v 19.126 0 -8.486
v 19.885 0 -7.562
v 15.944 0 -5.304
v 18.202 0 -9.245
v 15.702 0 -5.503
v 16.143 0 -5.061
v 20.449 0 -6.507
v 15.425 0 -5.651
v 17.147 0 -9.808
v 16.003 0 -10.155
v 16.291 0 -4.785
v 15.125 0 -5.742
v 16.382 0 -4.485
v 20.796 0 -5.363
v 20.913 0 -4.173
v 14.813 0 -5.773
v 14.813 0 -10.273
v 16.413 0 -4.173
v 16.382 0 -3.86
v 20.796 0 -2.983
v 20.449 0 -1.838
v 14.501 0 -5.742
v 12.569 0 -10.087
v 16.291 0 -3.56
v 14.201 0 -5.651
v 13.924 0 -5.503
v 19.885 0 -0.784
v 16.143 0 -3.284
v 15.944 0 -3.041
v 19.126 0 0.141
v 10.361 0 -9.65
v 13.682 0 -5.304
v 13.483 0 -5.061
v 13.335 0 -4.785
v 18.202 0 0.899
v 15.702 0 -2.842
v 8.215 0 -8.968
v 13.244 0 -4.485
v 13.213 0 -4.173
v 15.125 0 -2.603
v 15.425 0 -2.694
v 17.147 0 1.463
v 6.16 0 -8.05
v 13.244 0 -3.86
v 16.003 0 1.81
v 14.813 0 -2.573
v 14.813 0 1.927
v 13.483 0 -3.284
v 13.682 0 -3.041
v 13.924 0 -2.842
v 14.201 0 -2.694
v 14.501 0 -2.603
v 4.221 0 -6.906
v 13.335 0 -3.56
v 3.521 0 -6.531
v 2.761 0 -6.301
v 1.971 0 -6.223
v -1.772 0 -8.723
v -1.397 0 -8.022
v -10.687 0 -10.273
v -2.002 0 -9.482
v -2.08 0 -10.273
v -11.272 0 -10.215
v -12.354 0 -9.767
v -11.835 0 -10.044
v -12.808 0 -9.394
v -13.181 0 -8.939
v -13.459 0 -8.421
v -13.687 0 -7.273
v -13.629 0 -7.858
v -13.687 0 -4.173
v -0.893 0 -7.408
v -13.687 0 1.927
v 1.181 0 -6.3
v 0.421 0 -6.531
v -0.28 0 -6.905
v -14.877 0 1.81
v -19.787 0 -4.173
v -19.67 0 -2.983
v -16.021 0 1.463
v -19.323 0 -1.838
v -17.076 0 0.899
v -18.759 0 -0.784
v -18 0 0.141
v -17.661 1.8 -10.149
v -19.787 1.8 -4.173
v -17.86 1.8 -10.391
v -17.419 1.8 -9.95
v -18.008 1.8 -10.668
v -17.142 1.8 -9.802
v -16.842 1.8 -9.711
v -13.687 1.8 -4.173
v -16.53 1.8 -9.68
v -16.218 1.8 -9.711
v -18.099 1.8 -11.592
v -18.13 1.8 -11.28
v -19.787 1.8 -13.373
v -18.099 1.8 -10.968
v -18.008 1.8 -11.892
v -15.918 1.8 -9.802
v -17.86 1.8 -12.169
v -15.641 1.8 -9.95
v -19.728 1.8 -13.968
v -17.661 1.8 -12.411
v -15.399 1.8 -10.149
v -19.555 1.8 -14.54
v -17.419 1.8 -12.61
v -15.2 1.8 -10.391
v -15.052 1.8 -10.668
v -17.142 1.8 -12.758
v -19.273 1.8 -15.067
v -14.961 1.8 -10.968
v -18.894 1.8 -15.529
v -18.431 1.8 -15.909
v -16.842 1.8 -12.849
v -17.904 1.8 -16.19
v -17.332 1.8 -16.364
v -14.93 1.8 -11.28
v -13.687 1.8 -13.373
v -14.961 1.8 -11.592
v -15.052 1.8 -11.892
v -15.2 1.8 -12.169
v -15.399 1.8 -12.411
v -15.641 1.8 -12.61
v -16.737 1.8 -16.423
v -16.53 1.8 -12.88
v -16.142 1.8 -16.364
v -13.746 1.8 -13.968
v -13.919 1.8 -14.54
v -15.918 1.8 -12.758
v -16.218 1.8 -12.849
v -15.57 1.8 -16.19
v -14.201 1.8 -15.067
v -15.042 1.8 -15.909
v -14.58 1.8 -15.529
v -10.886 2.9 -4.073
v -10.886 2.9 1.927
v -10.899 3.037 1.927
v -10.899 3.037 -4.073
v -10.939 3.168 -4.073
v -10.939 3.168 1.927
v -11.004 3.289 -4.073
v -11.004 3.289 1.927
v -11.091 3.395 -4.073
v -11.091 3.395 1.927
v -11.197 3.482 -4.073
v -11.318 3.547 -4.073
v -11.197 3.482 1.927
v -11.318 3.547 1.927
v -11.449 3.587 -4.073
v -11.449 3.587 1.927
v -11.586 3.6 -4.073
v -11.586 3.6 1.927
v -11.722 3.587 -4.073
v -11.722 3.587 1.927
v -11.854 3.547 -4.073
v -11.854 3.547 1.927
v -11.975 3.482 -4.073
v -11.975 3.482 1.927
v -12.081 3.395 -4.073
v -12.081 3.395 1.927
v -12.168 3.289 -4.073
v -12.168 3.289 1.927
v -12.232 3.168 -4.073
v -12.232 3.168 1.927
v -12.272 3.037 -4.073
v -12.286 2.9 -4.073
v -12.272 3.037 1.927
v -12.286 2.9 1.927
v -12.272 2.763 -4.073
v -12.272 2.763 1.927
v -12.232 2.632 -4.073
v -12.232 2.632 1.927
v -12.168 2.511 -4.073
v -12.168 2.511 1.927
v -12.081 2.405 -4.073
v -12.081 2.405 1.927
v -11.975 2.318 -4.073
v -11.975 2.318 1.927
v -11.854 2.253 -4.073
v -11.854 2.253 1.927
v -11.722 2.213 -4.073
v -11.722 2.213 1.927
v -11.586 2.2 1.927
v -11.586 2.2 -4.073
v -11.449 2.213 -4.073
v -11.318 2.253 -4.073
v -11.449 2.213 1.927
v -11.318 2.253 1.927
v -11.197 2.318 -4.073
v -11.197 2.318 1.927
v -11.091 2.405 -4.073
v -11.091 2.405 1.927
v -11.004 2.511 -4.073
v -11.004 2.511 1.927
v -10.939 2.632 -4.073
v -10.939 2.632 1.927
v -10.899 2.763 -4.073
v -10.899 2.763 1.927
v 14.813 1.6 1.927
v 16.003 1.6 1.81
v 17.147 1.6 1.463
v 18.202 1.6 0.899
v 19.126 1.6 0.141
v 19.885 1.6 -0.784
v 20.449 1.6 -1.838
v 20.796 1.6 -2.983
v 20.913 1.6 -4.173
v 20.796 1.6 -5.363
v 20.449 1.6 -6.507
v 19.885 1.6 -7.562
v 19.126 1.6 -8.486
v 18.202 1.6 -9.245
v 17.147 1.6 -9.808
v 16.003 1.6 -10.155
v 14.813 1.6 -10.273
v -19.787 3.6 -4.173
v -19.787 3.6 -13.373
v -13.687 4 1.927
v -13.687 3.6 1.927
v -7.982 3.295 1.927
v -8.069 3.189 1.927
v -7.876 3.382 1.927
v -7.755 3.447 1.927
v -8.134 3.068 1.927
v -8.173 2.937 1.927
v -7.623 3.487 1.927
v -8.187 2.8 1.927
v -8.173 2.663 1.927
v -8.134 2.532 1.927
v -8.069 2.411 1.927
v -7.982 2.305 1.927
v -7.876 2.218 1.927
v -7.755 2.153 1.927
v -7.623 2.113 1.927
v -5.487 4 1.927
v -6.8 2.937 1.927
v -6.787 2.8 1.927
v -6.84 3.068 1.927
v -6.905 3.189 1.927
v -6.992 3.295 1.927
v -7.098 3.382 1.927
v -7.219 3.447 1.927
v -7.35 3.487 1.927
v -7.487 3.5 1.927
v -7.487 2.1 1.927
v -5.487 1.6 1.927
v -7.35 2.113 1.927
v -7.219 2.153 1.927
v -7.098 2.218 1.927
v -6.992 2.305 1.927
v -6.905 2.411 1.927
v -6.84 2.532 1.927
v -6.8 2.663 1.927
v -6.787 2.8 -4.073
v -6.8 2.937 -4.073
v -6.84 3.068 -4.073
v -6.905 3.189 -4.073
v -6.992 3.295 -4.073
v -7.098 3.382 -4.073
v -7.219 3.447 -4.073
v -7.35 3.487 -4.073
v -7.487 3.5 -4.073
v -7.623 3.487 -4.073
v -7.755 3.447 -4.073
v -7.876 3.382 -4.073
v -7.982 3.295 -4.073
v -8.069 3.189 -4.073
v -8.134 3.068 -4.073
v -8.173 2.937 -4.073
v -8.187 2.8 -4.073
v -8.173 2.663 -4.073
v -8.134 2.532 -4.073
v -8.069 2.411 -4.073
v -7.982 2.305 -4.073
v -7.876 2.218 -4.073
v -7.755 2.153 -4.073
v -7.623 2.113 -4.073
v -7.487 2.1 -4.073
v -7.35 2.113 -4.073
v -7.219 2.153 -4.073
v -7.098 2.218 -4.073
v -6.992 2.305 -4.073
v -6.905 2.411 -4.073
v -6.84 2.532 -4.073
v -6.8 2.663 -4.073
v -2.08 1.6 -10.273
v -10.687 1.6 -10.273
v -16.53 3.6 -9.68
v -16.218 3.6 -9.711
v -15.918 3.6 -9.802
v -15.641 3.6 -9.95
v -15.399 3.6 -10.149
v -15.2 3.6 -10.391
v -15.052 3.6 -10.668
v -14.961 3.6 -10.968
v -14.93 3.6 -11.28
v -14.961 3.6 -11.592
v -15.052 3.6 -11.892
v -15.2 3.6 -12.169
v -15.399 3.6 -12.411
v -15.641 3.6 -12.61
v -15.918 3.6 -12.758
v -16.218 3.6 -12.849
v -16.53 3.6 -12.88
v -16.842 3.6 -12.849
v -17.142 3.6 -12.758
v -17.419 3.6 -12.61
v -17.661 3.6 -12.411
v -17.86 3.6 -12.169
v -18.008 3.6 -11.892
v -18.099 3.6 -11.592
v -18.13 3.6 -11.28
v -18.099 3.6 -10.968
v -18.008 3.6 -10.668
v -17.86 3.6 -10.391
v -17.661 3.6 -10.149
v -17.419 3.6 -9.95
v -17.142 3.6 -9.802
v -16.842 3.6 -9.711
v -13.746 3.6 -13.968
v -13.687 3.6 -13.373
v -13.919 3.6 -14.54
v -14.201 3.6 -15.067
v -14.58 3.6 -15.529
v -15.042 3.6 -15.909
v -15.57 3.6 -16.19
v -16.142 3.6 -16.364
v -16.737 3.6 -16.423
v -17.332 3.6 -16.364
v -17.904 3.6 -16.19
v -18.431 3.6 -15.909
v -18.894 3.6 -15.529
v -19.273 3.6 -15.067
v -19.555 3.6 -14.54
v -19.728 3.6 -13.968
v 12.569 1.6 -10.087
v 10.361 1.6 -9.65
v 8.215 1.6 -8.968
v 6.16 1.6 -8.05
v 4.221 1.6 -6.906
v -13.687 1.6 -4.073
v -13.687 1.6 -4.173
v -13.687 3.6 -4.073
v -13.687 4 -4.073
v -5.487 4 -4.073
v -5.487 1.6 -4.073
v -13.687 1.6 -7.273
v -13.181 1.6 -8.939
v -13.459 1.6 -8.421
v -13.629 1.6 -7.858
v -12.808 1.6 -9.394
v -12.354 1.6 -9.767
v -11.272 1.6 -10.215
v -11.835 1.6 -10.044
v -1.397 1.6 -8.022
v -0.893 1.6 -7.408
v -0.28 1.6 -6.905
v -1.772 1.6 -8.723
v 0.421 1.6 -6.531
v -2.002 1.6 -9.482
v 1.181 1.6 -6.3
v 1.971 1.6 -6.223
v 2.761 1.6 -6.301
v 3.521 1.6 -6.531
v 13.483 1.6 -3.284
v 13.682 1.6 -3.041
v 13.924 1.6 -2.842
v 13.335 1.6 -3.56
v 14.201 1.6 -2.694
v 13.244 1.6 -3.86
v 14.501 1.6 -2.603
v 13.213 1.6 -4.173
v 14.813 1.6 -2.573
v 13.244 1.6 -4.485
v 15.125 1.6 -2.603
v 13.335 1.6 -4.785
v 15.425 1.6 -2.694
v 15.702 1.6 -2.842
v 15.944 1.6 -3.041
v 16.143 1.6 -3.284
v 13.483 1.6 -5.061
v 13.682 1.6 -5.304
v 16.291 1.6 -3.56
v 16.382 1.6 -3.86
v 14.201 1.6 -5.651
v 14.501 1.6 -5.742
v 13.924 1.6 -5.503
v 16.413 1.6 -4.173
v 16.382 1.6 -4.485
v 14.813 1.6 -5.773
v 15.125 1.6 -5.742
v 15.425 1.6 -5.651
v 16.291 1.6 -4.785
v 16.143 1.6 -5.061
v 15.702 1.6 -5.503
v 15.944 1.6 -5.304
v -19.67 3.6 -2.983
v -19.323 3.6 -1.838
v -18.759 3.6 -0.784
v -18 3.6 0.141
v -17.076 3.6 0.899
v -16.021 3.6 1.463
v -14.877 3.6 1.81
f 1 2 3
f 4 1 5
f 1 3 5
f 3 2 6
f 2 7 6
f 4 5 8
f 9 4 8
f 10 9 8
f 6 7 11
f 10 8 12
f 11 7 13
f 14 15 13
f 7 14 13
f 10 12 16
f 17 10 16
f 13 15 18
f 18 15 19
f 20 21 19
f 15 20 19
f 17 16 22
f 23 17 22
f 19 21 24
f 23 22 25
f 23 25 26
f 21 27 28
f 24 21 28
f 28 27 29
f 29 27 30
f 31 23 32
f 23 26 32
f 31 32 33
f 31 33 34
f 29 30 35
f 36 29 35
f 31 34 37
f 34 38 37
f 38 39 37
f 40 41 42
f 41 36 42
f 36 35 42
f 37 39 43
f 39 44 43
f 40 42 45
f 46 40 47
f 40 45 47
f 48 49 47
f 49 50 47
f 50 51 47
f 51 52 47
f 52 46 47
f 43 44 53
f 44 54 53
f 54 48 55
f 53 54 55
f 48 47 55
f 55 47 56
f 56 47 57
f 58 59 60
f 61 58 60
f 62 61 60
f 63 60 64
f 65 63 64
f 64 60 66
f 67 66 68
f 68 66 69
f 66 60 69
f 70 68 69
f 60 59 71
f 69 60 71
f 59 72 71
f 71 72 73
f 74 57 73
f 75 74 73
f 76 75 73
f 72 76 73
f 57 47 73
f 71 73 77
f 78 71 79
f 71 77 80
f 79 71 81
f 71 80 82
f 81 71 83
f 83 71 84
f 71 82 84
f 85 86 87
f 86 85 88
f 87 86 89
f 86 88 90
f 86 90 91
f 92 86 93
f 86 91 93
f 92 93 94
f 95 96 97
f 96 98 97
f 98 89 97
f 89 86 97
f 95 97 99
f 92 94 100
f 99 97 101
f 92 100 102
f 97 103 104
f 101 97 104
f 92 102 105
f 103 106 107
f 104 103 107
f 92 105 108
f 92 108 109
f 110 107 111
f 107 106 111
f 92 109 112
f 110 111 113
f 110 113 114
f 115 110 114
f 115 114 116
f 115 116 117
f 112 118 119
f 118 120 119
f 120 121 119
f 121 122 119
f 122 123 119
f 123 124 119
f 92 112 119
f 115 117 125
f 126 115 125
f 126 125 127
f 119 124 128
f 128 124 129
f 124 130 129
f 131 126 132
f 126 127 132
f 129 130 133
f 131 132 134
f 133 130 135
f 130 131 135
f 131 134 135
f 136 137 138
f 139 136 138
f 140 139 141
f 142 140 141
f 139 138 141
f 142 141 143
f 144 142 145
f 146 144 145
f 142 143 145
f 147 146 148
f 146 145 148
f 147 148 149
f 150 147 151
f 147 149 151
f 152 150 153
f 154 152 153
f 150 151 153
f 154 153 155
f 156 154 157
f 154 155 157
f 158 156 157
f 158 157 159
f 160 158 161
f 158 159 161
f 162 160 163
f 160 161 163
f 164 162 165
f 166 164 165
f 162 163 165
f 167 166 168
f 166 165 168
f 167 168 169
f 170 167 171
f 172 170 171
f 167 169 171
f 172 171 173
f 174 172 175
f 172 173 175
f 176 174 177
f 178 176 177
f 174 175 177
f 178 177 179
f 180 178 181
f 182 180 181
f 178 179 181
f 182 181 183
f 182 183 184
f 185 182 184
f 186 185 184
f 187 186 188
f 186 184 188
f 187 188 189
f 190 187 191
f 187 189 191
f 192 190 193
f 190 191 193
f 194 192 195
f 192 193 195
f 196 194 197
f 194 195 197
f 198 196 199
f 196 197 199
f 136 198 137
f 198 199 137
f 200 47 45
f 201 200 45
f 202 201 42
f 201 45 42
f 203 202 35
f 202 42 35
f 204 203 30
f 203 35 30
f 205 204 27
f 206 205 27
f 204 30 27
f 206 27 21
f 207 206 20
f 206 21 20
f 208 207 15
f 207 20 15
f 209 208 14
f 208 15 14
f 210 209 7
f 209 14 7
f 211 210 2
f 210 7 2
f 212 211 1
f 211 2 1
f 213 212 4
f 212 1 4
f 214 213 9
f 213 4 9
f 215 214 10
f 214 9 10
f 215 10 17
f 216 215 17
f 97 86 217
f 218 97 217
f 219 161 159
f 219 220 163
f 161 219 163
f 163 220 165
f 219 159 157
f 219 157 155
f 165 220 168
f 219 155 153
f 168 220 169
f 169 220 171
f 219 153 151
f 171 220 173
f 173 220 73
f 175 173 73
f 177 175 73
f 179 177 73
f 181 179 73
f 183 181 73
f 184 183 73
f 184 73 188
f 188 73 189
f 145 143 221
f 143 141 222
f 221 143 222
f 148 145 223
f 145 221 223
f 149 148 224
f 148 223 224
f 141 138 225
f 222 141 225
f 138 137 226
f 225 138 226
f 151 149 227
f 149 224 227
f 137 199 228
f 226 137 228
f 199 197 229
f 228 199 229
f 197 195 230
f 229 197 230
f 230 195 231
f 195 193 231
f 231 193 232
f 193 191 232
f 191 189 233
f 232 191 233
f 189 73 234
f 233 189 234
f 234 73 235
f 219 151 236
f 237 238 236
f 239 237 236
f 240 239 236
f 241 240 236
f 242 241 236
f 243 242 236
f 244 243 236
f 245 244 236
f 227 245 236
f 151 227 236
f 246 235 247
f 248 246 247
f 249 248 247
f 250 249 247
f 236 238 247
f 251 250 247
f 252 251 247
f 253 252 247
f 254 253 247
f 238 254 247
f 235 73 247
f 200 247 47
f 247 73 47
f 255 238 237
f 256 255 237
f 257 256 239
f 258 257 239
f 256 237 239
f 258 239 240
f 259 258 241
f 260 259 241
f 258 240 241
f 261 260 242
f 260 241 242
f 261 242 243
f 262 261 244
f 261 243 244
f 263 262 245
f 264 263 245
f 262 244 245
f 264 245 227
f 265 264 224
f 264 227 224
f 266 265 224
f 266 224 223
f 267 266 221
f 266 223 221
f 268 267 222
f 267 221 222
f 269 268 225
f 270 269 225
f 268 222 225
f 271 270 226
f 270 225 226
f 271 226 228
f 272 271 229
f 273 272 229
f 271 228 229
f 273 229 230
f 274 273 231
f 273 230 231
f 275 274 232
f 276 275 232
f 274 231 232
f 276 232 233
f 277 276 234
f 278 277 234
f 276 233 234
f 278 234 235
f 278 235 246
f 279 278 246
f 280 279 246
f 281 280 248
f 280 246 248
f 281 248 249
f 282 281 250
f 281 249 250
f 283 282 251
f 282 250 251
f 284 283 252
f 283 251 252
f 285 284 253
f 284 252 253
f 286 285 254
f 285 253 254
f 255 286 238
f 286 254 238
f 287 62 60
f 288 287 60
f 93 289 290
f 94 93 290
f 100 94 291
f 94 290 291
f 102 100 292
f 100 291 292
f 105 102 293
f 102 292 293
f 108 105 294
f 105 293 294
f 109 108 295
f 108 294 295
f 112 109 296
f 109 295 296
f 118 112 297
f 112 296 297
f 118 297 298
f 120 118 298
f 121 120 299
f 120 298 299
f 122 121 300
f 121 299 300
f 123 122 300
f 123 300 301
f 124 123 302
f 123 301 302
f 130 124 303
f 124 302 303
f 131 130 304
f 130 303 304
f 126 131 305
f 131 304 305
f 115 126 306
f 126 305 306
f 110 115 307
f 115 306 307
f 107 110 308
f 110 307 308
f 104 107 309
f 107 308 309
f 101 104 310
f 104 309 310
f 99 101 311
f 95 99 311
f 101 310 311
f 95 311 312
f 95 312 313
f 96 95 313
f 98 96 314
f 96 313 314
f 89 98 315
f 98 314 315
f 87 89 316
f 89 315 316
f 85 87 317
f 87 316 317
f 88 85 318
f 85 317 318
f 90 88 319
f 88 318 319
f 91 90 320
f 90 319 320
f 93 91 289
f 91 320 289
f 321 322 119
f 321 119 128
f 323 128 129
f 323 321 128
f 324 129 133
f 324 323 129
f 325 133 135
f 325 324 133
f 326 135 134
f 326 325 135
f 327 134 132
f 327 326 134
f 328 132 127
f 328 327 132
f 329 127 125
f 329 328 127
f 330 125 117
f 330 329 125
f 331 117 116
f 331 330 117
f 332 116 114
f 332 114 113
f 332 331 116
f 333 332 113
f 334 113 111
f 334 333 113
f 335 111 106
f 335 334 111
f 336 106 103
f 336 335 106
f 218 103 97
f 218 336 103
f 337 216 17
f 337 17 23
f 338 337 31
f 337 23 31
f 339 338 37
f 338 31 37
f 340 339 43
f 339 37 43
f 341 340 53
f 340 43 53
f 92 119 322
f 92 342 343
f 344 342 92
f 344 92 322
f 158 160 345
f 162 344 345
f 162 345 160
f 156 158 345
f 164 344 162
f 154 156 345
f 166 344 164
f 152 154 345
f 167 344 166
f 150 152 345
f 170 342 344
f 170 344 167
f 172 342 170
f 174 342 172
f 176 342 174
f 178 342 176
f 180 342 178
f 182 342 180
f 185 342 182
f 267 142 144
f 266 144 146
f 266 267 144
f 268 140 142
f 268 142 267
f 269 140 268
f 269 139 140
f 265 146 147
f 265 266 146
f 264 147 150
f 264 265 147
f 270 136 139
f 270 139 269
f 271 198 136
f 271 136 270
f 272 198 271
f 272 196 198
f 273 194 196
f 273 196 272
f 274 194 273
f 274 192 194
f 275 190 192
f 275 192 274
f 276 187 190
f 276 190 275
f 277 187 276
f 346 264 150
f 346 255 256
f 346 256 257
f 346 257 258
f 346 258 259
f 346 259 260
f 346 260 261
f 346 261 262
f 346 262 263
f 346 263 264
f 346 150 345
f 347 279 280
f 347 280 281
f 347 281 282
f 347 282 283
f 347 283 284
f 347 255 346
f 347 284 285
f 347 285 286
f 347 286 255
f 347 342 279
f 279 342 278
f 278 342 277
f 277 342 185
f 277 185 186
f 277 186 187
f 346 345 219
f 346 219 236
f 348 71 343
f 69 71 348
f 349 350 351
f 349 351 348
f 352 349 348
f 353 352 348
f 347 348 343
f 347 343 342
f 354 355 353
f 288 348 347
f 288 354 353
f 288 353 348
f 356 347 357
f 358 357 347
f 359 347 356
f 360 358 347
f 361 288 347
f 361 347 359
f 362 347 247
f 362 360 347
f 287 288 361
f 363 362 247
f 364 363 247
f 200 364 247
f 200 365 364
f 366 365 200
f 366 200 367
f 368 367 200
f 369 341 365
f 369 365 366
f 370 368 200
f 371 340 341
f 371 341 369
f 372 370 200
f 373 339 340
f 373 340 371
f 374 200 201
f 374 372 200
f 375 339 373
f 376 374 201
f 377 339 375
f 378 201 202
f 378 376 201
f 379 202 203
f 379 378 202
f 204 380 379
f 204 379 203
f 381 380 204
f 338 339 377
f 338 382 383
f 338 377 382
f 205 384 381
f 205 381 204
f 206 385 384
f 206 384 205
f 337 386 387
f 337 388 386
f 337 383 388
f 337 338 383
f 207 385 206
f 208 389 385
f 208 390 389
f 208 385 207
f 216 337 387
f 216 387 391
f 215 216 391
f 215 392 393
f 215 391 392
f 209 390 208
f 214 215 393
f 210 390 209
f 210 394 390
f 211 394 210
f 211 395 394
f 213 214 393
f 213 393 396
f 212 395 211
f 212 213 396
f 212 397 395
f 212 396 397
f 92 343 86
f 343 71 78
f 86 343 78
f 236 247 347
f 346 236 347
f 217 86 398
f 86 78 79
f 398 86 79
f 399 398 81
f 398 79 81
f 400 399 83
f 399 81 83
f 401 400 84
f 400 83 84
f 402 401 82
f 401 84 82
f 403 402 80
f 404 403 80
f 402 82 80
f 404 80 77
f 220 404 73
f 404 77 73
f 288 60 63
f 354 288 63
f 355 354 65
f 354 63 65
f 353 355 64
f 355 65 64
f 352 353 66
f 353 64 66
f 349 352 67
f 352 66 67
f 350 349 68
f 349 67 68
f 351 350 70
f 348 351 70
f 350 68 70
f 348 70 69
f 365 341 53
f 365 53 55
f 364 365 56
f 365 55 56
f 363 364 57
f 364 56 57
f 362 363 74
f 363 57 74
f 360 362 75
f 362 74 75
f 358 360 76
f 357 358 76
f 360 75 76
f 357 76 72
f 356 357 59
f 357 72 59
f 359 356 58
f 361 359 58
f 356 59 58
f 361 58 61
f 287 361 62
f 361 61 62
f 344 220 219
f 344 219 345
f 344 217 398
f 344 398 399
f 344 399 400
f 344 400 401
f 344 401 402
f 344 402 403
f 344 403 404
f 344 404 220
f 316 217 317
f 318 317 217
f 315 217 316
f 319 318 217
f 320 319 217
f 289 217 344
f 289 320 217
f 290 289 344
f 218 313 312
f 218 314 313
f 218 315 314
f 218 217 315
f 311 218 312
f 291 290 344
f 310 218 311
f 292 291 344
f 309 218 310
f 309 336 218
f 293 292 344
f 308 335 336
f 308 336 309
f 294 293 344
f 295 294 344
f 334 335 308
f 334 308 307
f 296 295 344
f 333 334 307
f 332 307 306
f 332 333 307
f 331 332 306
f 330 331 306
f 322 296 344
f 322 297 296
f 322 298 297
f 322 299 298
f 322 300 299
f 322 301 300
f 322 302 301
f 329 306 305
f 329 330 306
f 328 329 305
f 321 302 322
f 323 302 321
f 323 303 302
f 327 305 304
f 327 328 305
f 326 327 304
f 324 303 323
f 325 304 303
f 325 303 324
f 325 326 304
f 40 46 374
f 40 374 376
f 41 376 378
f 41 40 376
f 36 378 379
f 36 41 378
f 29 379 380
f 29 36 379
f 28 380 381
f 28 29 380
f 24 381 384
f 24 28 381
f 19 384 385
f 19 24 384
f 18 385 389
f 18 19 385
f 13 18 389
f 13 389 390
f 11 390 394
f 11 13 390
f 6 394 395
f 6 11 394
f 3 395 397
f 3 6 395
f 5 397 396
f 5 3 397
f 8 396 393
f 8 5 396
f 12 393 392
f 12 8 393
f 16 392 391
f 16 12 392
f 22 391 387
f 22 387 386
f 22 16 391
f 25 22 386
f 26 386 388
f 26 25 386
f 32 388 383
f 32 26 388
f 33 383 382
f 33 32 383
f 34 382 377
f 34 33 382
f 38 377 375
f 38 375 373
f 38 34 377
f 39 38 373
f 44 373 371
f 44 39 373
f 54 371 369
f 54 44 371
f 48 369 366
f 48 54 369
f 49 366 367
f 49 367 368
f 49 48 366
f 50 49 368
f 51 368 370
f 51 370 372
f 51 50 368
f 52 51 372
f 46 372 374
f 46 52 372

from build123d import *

# Parameters (mm, degrees)
SKETCH1_R           = 1.6
BOSS_EXTRUDE1_DEPTH = 1.6
SKETCH2_W           = 8.2
SKETCH2_H           = 6
BOSS_EXTRUDE2_DEPTH = 2.4
SKETCH3_R           = 0.7
CUT_EXTRUDE1_DEPTH  = 6
BOSS_EXTRUDE3_DEPTH = 3.6
SKETCH5_W           = 6.1
SKETCH5_H           = 1.8
BOSS_EXTRUDE4_DEPTH = 9.2
BOSS_EXTRUDE5_DEPTH = 1.8
SKETCH7_R           = 1.6
CUT_EXTRUDE2_DEPTH  = 1.8
FILLET1_R           = 20


with BuildPart() as part:
    # Sketch1 → Boss-Extrude1 (new body)
    with BuildSketch(Plane(origin=(0, 0, 0), x_dir=(1, 0, 0), z_dir=(0, 1, 0))):
        with BuildLine():
            Line((-13.686930091, -1.927431611), (14.813069909, -1.927431611))
            ThreePointArc((14.813069909, -1.927431611), (20.913069909, 4.172568389), (14.813069909, 10.272568389))
            Line((14.813069909, 10.272568389), (6.020069909, 10.272568389))
            ThreePointArc((6.020069909, 10.272568389), (1.970069909, 6.222568389), (-2.079930091, 10.272568389))
            Line((-2.079930091, 10.272568389), (-10.686930091, 10.272568389))
            ThreePointArc((-10.686930091, 10.272568389), (-12.808250435, 9.393888733), (-13.686930091, 7.272568389))
            Line((-13.686930091, 7.272568389), (-13.686930091, 4.172568389))
            Line((-13.686930091, 4.172568389), (-13.686930091, -1.927431611))
        make_face()
        with Locations(Location((14.813069909, 4.172568389, 0), (0, 0, 270))):
            Circle(SKETCH1_R, mode=Mode.SUBTRACT)
    extrude(amount=BOSS_EXTRUDE1_DEPTH)

    # Sketch2 → Boss-Extrude2 (add)
    with BuildSketch(Plane(origin=(0, 1.6, 0), x_dir=(1, 0, 0), z_dir=(0, 1, 0))):
        with Locations((-9.586930091, 1.072568389)):
            Rectangle(SKETCH2_W, SKETCH2_H)
    extrude(amount=BOSS_EXTRUDE2_DEPTH)

    # Sketch3 → Cut-Extrude1 (cut)
    with BuildSketch(Plane.XY.offset(1.927431611)):
        with Locations((-11.585711123, 2.899970269)):
            Circle(SKETCH3_R)
        with Locations((-7.486930091, 2.8)):
            Circle(SKETCH3_R)
    extrude(amount=-CUT_EXTRUDE1_DEPTH, mode=Mode.SUBTRACT)



with BuildPart() as body_2:
    # Sketch4 → Boss-Extrude3 (new body)
    with BuildSketch(Plane.XZ):
        with BuildLine():
            Line((-13.686930091, 1.927431611), (-13.686930091, -4.172568389))
            Line((-13.686930091, -4.172568389), (-19.786930091, -4.172568389))
            ThreePointArc((-19.786930091, -4.172568389), (-18.000281456, 0.140782976), (-13.686930091, 1.927431611))
        make_face()
    extrude(amount=-BOSS_EXTRUDE3_DEPTH)


with BuildPart() as part_1:
    add(part.part)

    add(body_2.part)  # Boss-Extrude4 merges body 2
    # Sketch5 → Boss-Extrude4 (add)
    with BuildSketch(Plane(origin=(0, 0, -4.172568389), x_dir=(-1, 0, 0), z_dir=(0, 0, -1))):
        with Locations((16.736930091, 2.7)):
            Rectangle(SKETCH5_W, SKETCH5_H)
    extrude(amount=BOSS_EXTRUDE4_DEPTH)

    # Sketch6 → Boss-Extrude5 (add)
    with BuildSketch(Plane(origin=(0, 3.6, 0), x_dir=(1, 0, 0), z_dir=(0, 1, 0))):
        with BuildLine():
            Line((-19.786930091, 13.372568389), (-13.686930091, 13.372568389))
            ThreePointArc((-13.686930091, 13.372568389), (-16.736930091, 16.422568389), (-19.786930091, 13.372568389))
        make_face()
    extrude(amount=-BOSS_EXTRUDE5_DEPTH)

    # Sketch7 → Cut-Extrude2 (cut)
    with BuildSketch(Plane(origin=(0, 3.6, 0), x_dir=(1, 0, 0), z_dir=(0, 1, 0))):
        with Locations(Location((-16.530026975, 11.280054915, 0), (0, 0, 270))):
            Circle(SKETCH7_R)
    extrude(amount=-CUT_EXTRUDE2_DEPTH, mode=Mode.SUBTRACT)

    # Fillet1
    # the kernel refuses this fillet: 20 mm, written as the material it takes off along each edge
    with BuildSketch(Plane(origin=(6.020069909, -21.9825, -10.272568389), x_dir=(-0.47127431381884255, 0, 0.8819866898851587), z_dir=(0, 1, 0))) as fillet1_piece_1:
        with BuildLine():
            CenterArc((13.242808218, 17.639733798), FILLET1_R, 209.618411235, 32.264541926)
            Line((-4.143915041, 7.755308964), (-4.491649507, 7.557620467))
            ThreePointArc((-4.491649507, 7.557620467), (-2.424752197, 3.689144757), (-0.352794676, -0.188509726))
            Line((-0.352794676, -0.188509726), (0.188509726, -0.352794676))
            ThreePointArc((0.188509726, -0.352794676), (1.908660971, 0.077953906), (3.628812216, -0.352794676))
            Line((3.628812216, -0.352794676), (3.817321942, 0))
        make_face()
    extrude(amount=45.565, mode=Mode.SUBTRACT)


solid = part_1.part
